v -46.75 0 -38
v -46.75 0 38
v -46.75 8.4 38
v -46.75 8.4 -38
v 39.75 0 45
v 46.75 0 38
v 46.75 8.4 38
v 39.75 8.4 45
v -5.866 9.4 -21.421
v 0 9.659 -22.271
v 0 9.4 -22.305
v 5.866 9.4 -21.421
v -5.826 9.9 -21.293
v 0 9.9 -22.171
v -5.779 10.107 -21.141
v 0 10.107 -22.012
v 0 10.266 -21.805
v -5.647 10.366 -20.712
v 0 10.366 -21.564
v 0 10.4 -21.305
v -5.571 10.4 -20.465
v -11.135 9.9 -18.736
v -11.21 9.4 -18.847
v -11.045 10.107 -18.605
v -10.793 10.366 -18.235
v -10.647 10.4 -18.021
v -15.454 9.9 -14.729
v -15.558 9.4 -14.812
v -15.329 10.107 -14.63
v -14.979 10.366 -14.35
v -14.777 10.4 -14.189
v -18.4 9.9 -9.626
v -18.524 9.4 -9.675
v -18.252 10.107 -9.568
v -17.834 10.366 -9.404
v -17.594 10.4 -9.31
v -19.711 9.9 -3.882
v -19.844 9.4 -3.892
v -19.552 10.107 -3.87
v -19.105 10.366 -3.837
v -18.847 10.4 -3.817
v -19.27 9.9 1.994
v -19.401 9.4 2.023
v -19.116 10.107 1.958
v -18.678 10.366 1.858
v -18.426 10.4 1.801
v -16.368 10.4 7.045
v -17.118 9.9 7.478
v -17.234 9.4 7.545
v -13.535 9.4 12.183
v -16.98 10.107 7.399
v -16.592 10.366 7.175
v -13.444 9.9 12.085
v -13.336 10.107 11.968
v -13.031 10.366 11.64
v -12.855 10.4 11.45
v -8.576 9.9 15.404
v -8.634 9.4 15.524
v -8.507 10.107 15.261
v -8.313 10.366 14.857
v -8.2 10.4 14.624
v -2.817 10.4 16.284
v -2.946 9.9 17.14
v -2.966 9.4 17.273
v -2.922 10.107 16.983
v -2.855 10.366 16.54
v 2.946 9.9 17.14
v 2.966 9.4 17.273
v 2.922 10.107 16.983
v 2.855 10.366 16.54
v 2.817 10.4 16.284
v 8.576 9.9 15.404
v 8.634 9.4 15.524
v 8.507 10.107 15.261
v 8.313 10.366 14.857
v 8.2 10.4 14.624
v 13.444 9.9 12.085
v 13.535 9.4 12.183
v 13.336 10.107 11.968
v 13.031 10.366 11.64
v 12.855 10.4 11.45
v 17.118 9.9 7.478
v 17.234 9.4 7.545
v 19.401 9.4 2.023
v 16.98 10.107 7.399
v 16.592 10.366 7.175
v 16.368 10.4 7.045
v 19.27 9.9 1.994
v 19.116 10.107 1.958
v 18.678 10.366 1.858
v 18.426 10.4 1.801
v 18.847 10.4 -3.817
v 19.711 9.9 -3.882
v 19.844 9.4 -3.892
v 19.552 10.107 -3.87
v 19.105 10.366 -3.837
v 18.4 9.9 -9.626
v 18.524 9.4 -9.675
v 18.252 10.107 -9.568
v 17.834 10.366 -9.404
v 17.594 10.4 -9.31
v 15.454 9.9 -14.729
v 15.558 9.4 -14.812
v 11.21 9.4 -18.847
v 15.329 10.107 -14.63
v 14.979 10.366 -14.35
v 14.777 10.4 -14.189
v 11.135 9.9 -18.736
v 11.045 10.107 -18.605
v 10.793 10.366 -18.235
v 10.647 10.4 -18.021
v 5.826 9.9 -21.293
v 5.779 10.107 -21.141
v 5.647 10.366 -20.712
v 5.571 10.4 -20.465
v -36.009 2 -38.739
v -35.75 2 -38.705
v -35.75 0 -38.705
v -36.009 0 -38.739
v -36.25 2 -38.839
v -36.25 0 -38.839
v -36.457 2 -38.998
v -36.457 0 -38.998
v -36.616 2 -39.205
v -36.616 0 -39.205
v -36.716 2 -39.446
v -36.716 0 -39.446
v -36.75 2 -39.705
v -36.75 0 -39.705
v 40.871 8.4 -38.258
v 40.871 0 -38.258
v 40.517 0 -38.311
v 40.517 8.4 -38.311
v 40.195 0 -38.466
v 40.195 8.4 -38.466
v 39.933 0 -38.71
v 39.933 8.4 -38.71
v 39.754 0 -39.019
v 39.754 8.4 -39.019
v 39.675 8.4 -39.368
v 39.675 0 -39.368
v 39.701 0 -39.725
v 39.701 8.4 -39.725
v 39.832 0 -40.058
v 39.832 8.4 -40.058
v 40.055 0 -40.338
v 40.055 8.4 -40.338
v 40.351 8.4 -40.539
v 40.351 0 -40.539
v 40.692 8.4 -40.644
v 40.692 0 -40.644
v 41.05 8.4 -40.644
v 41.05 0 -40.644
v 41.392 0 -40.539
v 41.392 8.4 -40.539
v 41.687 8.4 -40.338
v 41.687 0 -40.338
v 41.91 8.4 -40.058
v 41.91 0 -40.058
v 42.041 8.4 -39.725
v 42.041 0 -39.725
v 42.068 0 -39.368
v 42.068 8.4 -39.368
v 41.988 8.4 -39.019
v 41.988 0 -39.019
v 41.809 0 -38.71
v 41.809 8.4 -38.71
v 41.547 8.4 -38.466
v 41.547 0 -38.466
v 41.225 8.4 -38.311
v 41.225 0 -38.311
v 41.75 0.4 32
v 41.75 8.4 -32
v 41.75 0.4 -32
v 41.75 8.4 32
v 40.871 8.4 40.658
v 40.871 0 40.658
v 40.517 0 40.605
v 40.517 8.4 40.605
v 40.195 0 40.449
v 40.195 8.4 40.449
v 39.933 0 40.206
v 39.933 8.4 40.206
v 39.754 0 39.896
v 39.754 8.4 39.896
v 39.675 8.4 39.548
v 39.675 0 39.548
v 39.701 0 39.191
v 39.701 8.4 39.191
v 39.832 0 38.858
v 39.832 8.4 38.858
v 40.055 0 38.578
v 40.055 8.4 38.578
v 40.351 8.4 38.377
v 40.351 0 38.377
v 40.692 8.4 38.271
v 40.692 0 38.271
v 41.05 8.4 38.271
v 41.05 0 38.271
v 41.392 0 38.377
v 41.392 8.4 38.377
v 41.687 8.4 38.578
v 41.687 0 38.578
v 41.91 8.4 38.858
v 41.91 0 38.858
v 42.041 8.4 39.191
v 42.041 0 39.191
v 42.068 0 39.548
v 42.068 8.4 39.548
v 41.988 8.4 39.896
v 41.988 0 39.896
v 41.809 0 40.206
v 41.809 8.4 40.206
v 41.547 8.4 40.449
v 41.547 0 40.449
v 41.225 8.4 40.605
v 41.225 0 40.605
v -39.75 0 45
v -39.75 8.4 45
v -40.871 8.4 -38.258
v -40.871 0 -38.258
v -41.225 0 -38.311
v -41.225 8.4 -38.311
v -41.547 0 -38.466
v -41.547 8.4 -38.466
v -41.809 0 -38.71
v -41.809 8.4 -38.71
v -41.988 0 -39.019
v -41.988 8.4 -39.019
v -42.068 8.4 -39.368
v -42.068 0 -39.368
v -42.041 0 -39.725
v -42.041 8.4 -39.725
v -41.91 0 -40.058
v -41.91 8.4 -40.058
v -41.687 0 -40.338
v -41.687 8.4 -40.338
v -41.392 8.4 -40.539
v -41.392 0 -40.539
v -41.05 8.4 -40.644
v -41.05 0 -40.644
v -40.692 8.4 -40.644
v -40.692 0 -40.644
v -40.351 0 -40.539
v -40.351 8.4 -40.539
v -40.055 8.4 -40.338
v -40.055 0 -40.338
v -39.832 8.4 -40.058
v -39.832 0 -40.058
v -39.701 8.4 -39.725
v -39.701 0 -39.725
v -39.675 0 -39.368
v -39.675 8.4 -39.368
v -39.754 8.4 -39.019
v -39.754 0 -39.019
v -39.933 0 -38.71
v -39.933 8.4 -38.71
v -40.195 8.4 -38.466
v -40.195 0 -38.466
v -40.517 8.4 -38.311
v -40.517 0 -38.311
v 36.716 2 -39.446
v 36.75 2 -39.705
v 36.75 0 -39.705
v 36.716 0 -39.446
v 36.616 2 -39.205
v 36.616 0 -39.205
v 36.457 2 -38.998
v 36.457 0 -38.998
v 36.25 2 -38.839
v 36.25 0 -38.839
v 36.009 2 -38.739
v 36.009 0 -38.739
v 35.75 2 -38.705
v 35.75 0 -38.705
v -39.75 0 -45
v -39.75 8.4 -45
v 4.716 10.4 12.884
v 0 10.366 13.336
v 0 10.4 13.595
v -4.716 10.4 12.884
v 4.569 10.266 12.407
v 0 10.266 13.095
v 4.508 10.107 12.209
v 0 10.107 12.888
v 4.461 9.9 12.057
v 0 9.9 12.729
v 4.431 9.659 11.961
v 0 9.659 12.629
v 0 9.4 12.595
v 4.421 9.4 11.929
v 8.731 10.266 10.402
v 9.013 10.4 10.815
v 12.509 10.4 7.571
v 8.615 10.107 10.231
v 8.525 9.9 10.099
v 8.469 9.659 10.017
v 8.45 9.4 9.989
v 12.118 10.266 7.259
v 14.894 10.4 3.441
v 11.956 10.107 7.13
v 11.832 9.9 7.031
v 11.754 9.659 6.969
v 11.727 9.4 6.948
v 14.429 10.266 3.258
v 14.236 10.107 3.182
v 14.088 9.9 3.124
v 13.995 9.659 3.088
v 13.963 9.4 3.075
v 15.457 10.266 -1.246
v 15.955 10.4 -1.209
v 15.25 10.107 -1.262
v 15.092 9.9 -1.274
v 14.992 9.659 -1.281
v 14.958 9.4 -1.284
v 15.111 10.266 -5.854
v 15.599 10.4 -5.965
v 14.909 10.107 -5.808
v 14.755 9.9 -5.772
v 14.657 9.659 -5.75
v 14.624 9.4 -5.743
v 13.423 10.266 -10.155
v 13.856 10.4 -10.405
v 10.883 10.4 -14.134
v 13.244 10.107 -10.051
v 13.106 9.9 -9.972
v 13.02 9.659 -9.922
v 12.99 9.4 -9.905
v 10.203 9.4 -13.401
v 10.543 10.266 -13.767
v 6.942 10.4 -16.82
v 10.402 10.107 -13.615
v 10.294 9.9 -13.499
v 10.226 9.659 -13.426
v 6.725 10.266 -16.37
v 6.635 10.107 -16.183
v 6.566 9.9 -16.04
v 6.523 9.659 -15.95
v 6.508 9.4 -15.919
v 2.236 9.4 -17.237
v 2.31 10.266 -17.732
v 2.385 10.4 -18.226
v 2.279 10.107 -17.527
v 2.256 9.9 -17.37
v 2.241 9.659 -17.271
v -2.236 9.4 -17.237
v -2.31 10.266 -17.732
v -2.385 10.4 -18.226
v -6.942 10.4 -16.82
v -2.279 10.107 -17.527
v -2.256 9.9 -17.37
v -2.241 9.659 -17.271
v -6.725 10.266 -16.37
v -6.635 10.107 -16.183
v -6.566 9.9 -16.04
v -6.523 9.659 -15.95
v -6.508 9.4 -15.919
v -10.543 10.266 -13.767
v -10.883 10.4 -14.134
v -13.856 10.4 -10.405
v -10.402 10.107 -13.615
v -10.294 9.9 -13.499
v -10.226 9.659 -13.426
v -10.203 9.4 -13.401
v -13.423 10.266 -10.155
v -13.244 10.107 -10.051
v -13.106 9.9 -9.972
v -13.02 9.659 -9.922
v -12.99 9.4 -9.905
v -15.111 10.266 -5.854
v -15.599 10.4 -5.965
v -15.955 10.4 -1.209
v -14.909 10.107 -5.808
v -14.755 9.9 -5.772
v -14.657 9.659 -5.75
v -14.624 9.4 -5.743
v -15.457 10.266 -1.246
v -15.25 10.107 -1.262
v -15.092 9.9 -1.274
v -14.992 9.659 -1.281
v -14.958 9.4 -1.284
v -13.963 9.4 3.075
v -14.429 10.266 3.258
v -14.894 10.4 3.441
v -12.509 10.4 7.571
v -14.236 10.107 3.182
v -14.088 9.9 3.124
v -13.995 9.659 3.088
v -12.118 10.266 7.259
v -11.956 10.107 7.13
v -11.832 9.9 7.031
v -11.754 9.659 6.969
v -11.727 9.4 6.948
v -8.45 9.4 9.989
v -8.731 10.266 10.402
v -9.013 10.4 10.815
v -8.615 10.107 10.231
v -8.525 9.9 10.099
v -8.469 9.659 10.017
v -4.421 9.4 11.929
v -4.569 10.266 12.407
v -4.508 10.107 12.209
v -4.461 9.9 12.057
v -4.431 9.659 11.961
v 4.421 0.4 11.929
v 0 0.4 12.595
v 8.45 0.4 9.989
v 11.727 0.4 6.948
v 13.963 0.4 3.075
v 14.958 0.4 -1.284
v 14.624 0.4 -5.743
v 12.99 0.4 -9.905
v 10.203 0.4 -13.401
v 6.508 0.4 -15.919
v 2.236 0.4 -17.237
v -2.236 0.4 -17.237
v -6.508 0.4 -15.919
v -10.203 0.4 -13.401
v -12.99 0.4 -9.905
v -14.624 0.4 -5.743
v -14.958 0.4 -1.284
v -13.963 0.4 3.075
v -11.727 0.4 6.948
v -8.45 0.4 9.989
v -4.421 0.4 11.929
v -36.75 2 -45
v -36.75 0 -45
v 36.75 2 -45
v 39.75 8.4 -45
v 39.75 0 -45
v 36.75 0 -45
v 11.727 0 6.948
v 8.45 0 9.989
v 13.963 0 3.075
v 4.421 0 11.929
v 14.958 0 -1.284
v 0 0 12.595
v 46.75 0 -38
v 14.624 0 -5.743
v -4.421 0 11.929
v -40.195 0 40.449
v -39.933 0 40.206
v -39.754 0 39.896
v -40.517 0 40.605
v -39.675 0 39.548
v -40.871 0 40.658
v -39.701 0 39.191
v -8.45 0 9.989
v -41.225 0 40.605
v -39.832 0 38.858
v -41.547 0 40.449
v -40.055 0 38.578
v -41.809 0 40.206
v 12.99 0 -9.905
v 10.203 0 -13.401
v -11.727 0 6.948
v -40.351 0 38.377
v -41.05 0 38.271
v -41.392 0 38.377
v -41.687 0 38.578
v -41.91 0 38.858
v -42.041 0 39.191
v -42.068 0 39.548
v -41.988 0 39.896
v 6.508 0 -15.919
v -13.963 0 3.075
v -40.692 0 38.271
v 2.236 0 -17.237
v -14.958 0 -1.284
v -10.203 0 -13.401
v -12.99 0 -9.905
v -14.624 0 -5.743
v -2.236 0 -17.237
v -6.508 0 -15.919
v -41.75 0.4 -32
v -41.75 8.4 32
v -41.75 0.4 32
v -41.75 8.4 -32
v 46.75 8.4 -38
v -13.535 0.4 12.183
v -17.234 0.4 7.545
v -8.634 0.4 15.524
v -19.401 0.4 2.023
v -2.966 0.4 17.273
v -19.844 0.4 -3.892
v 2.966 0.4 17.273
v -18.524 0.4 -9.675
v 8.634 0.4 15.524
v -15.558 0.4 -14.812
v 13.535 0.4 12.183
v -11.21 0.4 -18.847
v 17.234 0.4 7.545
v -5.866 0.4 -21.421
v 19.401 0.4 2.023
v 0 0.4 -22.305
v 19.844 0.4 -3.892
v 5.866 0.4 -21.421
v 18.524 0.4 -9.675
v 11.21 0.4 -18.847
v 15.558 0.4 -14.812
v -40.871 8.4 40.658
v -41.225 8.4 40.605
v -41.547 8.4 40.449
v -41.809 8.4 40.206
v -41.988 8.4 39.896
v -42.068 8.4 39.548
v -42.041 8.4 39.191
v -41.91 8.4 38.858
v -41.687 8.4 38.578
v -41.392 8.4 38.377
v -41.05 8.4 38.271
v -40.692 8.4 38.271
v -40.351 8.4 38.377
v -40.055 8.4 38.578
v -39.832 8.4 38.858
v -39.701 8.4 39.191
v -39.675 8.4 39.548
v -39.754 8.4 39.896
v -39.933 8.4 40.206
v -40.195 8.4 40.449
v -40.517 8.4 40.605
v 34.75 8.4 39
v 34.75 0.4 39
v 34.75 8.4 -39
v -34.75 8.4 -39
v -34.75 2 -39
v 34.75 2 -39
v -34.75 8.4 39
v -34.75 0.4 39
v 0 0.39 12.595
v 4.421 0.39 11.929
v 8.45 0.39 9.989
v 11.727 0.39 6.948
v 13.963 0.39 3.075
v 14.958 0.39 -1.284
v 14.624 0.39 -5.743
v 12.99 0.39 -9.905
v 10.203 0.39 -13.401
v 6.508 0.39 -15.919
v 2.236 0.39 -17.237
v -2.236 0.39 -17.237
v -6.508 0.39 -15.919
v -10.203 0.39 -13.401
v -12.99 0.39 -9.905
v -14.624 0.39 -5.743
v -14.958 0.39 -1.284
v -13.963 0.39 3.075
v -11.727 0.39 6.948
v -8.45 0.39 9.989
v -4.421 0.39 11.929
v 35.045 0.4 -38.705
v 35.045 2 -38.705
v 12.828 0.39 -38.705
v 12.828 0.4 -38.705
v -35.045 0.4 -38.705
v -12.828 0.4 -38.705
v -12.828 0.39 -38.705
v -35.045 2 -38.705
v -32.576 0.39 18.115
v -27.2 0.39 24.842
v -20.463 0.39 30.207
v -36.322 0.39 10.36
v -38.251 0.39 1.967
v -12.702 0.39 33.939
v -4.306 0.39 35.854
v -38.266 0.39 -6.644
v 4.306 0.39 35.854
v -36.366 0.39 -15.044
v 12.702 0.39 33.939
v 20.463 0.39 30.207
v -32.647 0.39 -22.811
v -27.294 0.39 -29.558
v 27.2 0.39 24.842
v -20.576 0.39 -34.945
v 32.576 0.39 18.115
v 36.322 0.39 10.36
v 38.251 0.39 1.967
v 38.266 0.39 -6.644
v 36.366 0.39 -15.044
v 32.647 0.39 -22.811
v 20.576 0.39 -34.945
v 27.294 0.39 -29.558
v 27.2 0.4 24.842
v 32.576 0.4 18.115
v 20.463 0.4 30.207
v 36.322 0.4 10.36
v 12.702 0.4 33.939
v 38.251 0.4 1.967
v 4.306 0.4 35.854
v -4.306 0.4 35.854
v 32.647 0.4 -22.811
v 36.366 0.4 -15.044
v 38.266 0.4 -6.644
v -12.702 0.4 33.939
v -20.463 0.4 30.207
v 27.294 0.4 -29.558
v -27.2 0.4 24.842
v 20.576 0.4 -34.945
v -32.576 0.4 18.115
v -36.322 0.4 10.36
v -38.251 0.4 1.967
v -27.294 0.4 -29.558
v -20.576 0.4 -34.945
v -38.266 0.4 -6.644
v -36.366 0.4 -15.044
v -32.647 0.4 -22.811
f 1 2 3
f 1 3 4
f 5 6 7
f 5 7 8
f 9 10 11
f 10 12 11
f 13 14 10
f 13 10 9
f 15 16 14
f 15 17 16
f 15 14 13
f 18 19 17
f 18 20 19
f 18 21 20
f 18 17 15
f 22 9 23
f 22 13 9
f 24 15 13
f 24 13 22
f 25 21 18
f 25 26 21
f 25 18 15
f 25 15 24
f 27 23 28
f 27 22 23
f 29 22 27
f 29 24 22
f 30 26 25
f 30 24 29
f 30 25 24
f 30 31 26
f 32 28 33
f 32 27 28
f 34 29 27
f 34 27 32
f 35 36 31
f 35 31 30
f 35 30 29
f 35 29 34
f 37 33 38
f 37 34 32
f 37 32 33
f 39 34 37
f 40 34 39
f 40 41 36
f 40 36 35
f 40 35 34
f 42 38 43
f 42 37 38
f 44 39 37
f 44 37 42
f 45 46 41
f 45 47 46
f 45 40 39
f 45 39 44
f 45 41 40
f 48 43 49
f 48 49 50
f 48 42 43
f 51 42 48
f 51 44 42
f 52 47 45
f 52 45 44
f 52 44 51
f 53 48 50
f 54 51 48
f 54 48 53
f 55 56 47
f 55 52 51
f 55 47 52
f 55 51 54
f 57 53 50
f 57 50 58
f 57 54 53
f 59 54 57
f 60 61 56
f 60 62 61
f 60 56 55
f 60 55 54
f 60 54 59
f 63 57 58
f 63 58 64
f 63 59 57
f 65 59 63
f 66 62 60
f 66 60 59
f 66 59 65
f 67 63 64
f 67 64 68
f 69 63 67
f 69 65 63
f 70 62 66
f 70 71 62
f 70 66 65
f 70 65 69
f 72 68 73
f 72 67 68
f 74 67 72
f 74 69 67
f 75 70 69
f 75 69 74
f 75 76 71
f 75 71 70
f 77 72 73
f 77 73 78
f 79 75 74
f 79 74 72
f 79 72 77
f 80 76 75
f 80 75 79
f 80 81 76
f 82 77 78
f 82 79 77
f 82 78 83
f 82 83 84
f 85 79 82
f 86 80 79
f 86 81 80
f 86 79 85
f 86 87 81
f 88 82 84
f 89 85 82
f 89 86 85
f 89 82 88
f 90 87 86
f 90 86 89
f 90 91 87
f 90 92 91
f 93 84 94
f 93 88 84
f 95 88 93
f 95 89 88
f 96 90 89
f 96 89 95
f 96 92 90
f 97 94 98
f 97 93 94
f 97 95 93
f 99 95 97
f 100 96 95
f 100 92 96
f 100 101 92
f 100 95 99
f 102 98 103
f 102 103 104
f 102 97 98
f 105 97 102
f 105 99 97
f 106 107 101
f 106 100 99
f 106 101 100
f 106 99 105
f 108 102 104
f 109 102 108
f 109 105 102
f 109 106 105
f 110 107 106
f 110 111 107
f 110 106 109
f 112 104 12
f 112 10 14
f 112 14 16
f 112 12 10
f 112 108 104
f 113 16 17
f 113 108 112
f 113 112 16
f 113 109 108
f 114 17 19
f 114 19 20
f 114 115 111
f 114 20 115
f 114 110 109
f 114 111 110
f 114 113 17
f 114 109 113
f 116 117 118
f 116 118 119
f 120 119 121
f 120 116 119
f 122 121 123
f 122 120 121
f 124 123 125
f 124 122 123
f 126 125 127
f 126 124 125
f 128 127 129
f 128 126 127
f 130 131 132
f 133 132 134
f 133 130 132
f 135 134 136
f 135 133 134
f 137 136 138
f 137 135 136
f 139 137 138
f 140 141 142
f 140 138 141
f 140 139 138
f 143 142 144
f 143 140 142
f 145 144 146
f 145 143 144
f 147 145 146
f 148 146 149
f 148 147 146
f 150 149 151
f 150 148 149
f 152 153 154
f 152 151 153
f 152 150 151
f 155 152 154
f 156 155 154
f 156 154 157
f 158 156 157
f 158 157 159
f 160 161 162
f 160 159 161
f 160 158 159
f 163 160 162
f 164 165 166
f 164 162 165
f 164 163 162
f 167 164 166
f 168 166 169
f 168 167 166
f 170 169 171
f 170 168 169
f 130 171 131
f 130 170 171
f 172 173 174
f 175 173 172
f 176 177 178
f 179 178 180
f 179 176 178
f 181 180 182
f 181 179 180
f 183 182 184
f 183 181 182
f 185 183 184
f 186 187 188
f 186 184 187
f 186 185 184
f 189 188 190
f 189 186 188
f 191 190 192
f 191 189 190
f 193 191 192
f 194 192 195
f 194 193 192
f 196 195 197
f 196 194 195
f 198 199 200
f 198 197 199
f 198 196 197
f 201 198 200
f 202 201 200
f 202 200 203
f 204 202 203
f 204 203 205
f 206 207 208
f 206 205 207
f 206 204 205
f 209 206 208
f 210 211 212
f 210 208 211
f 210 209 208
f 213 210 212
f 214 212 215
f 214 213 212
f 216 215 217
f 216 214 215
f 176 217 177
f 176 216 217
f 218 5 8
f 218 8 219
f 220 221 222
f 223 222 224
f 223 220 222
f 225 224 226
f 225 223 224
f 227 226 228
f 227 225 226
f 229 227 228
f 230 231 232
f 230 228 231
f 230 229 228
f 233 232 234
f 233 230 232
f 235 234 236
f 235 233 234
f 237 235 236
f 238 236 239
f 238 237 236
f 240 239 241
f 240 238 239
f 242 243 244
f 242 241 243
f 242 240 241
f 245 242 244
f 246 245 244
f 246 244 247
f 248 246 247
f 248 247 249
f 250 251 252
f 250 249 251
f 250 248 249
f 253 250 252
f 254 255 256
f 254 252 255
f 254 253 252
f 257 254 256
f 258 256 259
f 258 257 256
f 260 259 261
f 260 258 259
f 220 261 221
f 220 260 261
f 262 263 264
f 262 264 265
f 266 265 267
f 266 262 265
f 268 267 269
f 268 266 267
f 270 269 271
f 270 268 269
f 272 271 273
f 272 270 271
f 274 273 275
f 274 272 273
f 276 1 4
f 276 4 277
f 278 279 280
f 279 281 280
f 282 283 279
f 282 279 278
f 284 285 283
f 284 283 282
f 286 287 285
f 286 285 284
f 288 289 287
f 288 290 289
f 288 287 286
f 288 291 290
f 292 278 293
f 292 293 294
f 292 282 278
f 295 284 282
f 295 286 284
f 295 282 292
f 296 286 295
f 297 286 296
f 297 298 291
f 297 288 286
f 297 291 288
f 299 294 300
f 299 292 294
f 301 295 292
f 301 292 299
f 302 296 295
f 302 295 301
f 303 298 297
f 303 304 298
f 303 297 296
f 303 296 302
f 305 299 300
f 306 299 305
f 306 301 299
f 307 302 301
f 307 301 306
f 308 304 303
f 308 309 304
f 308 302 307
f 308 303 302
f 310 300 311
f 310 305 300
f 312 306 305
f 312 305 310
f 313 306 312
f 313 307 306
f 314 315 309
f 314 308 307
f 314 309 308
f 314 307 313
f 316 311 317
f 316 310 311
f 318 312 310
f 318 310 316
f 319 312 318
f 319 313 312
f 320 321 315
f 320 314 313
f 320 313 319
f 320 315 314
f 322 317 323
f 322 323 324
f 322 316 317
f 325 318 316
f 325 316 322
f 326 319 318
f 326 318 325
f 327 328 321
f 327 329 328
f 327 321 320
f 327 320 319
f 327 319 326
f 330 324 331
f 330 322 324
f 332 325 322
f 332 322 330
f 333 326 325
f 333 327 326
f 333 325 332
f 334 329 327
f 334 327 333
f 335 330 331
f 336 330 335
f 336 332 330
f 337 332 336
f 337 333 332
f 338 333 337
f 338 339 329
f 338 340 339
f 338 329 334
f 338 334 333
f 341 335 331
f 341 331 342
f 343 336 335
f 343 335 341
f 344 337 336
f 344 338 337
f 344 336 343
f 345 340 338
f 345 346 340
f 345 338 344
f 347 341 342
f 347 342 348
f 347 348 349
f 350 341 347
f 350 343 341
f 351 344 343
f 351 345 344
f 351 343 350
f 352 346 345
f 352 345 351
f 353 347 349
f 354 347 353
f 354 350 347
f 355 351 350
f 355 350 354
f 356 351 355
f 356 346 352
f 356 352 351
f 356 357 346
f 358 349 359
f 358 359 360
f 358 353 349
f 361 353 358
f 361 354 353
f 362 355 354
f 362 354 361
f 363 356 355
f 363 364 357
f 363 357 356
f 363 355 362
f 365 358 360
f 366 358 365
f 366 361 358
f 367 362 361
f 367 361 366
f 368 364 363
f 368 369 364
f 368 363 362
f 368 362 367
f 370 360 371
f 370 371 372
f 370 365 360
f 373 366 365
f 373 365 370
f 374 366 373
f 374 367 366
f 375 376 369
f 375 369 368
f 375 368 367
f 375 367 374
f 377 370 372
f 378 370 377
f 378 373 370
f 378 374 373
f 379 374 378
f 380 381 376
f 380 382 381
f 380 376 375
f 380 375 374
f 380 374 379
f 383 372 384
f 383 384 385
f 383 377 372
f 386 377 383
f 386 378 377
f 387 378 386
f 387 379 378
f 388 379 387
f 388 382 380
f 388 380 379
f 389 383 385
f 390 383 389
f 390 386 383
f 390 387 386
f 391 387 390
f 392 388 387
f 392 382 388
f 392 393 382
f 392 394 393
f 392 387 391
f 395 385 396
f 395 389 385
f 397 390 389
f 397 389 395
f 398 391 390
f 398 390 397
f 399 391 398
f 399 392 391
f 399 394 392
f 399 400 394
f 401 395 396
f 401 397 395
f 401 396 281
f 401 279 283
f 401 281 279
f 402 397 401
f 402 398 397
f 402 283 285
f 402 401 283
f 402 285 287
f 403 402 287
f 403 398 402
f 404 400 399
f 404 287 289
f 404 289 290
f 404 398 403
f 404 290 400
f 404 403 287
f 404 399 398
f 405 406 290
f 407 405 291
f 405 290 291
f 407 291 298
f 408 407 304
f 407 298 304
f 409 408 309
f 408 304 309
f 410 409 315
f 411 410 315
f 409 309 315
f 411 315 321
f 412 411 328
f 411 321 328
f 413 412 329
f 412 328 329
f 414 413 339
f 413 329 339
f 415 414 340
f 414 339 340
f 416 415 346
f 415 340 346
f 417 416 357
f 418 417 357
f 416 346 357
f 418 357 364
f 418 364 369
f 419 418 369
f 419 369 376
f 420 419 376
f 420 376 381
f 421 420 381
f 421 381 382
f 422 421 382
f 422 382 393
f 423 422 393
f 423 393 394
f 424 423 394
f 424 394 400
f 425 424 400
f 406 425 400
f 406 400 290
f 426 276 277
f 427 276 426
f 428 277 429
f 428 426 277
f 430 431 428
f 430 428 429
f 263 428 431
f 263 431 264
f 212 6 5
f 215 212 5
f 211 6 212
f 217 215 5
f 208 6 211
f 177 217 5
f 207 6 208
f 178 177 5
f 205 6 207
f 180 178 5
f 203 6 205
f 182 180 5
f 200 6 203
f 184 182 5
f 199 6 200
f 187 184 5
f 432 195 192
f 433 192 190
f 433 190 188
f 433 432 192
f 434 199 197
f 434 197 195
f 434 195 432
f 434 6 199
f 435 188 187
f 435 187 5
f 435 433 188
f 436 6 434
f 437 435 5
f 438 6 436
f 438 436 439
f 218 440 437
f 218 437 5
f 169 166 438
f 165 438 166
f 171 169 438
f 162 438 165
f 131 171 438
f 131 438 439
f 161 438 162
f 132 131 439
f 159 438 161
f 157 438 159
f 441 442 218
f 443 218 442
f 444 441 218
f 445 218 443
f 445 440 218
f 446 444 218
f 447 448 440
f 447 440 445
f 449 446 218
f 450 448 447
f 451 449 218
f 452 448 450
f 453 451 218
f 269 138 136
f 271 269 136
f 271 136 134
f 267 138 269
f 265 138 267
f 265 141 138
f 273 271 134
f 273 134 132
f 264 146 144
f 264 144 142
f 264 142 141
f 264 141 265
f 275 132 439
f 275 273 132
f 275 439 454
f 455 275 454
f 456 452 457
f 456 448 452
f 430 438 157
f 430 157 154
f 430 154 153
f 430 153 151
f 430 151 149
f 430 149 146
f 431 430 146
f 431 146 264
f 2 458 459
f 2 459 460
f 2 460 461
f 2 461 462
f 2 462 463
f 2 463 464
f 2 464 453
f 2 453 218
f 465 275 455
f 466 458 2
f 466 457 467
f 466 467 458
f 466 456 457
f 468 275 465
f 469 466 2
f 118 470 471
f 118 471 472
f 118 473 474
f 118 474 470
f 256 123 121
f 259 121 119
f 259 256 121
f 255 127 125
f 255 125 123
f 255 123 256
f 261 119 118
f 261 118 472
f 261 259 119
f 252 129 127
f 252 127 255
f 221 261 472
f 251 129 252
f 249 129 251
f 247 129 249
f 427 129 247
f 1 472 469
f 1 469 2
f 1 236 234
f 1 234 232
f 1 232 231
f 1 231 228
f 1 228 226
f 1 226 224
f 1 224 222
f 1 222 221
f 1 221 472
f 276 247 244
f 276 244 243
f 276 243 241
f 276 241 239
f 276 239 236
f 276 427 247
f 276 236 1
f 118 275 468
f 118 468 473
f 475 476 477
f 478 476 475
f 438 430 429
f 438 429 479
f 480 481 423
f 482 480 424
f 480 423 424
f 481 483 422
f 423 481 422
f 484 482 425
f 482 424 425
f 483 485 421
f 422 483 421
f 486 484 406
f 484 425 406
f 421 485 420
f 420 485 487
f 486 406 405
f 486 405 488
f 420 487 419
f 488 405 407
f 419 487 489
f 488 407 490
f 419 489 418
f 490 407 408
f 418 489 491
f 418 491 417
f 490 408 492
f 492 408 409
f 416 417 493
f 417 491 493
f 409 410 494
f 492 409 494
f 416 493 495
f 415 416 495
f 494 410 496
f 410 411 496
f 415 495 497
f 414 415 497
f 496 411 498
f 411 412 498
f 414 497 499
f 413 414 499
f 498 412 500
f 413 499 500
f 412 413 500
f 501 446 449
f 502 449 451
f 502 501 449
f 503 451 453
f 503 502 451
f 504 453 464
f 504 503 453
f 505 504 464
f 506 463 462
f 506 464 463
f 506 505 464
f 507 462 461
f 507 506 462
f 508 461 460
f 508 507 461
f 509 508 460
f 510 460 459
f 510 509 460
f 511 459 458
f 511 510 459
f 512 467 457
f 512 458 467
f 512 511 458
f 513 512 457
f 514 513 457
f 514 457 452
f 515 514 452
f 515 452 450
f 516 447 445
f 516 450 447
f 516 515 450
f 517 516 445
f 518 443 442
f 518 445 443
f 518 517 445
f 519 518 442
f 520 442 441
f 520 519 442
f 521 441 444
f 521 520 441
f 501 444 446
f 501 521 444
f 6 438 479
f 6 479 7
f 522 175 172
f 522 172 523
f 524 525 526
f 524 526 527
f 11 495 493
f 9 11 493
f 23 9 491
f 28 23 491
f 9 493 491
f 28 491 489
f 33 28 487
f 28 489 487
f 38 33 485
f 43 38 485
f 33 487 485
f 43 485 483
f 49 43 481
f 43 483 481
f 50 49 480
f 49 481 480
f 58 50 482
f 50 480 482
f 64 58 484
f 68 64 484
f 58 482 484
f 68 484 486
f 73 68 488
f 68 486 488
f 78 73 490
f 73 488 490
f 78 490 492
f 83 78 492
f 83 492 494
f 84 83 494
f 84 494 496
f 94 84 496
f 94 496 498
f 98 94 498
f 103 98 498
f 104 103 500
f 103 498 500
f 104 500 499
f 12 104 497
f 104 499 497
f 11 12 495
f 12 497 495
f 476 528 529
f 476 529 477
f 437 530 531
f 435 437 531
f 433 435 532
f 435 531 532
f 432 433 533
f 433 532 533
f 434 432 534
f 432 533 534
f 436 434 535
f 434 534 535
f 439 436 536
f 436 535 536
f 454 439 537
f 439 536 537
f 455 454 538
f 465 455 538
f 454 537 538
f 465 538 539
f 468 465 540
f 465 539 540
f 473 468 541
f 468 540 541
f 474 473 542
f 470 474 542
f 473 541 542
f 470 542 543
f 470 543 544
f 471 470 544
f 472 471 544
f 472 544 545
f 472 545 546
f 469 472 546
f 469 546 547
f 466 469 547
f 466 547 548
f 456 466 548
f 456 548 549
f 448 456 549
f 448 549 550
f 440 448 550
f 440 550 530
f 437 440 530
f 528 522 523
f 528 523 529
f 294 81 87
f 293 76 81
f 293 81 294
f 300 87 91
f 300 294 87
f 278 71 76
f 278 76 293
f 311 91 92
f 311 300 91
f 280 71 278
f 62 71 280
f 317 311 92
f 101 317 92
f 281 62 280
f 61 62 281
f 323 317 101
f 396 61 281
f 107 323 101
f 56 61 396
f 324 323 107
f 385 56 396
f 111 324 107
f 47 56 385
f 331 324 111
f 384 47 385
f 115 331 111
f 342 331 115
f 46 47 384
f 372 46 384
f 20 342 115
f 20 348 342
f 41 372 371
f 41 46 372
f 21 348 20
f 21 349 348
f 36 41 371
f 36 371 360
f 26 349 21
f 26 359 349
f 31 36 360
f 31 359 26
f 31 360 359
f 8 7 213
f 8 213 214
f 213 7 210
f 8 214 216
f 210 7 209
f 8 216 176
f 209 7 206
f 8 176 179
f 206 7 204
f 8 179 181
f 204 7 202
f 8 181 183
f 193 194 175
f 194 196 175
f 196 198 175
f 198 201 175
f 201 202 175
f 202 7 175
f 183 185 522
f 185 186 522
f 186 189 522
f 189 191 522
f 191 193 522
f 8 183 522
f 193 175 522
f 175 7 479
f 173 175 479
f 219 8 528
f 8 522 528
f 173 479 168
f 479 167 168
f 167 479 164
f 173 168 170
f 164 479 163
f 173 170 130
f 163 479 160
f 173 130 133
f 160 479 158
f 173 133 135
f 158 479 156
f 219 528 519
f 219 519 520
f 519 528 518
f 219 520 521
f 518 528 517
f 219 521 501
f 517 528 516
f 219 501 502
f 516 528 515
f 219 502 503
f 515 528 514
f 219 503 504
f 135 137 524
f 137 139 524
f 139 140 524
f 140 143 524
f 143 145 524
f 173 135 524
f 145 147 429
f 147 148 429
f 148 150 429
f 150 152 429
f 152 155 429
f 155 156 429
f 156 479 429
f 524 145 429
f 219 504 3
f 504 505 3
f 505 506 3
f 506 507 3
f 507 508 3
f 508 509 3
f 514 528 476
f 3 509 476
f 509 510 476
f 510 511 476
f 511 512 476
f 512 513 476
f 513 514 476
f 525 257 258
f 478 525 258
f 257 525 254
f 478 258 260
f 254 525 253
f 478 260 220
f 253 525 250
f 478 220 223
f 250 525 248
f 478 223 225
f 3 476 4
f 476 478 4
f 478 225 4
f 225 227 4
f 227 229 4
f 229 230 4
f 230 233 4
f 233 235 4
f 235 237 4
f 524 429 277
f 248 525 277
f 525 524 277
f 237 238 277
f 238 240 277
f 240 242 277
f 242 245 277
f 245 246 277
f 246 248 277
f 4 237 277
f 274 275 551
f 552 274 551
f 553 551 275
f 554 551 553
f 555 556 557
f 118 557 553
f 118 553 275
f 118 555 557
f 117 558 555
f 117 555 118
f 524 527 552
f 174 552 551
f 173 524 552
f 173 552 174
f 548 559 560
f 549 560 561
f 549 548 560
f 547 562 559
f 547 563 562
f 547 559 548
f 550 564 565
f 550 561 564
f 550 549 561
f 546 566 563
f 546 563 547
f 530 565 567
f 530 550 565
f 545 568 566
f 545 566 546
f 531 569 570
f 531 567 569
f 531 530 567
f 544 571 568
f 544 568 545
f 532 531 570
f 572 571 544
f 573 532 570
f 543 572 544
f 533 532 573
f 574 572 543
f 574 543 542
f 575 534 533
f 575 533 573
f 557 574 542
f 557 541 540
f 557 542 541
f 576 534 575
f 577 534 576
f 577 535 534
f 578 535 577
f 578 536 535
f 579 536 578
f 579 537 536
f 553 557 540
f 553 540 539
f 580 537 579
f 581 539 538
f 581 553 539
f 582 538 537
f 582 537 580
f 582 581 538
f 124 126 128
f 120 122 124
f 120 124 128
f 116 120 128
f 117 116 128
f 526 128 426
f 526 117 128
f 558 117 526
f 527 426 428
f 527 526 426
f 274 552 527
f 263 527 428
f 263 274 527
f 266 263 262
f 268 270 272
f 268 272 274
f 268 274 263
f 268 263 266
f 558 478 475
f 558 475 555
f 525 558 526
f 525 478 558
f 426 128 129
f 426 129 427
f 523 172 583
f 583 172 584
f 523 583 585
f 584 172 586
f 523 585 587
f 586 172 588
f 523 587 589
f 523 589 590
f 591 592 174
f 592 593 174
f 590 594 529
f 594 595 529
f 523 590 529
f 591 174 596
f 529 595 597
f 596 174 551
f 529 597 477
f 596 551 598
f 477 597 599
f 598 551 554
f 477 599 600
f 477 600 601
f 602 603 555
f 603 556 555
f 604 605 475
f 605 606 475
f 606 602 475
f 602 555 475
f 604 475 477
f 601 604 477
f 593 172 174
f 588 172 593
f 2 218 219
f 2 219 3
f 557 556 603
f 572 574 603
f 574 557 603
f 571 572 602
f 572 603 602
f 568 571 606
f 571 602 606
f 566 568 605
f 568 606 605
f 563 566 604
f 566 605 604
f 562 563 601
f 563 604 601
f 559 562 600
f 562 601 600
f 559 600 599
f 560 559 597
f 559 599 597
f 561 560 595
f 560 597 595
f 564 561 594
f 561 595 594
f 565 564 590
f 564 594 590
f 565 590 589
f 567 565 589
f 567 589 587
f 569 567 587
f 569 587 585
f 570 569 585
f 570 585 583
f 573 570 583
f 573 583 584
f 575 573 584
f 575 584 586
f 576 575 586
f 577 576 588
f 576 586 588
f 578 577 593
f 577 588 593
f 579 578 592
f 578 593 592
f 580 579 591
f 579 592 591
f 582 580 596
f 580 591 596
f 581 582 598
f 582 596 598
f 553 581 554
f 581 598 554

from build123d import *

# Parameters (mm, degrees)
BOSS_EXTRUDE1_DEPTH           = 8.4
CUT_EXTRUDE1_DEPTH            = 66.430287329
CUT_EXTRUDE1_DEPTH_BACK       = 2
CUT_EXTRUDE2_DEPTH            = 8
SKETCH8_R                     = 19.9
BOSS_EXTRUDE2_DEPTH           = 10
FILLET1_R                     = 1
SKETCH9_R                     = 38.5
CUT_EXTRUDE4_DEPTH            = 0.01
M2_CLEARANCE_HOLE1_AT_2_COUNT = 2
M2_CLEARANCE_HOLE1_AT_2_PITCH = 81.742360825
M2_CLEARANCE_HOLE1_AT_3_COUNT = 2
M2_CLEARANCE_HOLE1_AT_3_PITCH = 113.62
M2_CLEARANCE_HOLE1_AT_4_COUNT = 2
M2_CLEARANCE_HOLE1_AT_4_PITCH = 78.915719896
SKETCH13_R                    = 15
CUT_EXTRUDE5_DEPTH            = 66.71698791
FILLET2_R                     = 1


with BuildPart() as part:
    # Sketch4 → Boss-Extrude1 (new body)
    with BuildSketch(Plane(origin=(0, 0, 0), x_dir=(1, 0, 0), z_dir=(0, 1, 0))):
        Polygon((-46.75, 38), (-39.75, 45), (39.75, 45), (46.75, 38), (46.75, -38), (39.75, -45), (-39.75, -45), (-46.75, -38), align=None)
    extrude(amount=BOSS_EXTRUDE1_DEPTH)

    # Sketch5 → Cut-Extrude1 (cut, two sides: drawn at the far end of the back side and taken through both)
    with BuildSketch(Plane.XZ.offset(-CUT_EXTRUDE1_DEPTH_BACK)):
        with BuildLine():
            Line((36.75, -300.538184403), (36.75, -45))
            Line((36.75, -45), (36.75, -39.704788024))
            ThreePointArc((36.75, -39.704788024), (36.457106781, -38.997681243), (35.75, -38.704788024))
            Line((35.75, -38.704788024), (-35.75, -38.704788024))
            ThreePointArc((-35.75, -38.704788024), (-36.457106781, -38.997681243), (-36.75, -39.704788024))
            Line((-36.75, -39.704788024), (-36.75, -45))
            Line((-36.75, -45), (-36.75, -300.538184403))
            Line((-36.75, -300.538184403), (-36.75, -811.614553209))
            Line((-36.75, -811.614553209), (36.75, -811.614553209))
            Line((36.75, -811.614553209), (36.75, -300.538184403))
        make_face()
    extrude(amount=CUT_EXTRUDE1_DEPTH + CUT_EXTRUDE1_DEPTH_BACK, mode=Mode.SUBTRACT)

    # Sketch6 → Cut-Extrude2 (cut)
    with BuildSketch(Plane(origin=(0, 8.4, 0), x_dir=(1, 0, 0), z_dir=(0, 1, 0))):
        Polygon((-41.75, 32), (-34.75, 39), (34.75, 39), (41.75, 32), (41.75, -32), (34.75, -39), (-34.75, -39), (-41.75, -32), align=None)
    extrude(amount=-CUT_EXTRUDE2_DEPTH, mode=Mode.SUBTRACT)

    # Sketch8 → Boss-Extrude2 (add)
    with BuildSketch(Plane(origin=(0, 0.4, 0), x_dir=(1, 0, 0), z_dir=(0, 1, 0))):
        with Locations(Location((0, 2.404788, 0), (0, 0, 90))):
            Circle(SKETCH8_R)
    extrude(amount=BOSS_EXTRUDE2_DEPTH)

    # Fillet1
    fillet1_edges = [part.edges().sort_by_distance(p)[0] for p in [
        (0, 10.4, 17.495212),
    ]]
    fillet(fillet1_edges, radius=FILLET1_R)

    # Sketch9 → Cut-Extrude4 (cut)
    with BuildSketch(Plane(origin=(0, 0.4, 0), x_dir=(1, 0, 0), z_dir=(0, 1, 0))):
        with Locations((0, 2.404788)):
            Circle(SKETCH9_R)
    extrude(amount=-CUT_EXTRUDE4_DEPTH, mode=Mode.SUBTRACT)


with BuildPart() as cut_extrude4_piece_1:
    # of the separate pieces the step leaves, piece 1, a body of its own (cut_extrude4_pieces)
    add(part.part.solids().sort_by_distance((-34.75, 0.4, 39))[0])

    # Sketch10 → M2 Clearance Hole1 (revolve, cut)
    with BuildSketch(Plane(origin=(40.871180413, 8.4, 39.457859948), x_dir=(0, 0, 1), z_dir=(1, 0, 0))):
        Polygon((0, 0), (0, 38.821032743), (1.2, 38.1), (1.2, 0), align=None)
    m2_clearance_hole1 = revolve(axis=Axis((40.871180413, 14.75, 39.457859948), (0, -1, 0)), mode=Mode.SUBTRACT)

    # M2 Clearance Hole1 at 2: M2 Clearance Hole1 ×2
    with Locations(*[(-i * M2_CLEARANCE_HOLE1_AT_2_PITCH, 0, 0) for i in range(1, M2_CLEARANCE_HOLE1_AT_2_COUNT)]):
        add(m2_clearance_hole1, mode=Mode.SUBTRACT)

    # M2 Clearance Hole1 at 3: M2 Clearance Hole1 ×2
    with Locations(*[Vector(-0.7194363741011156, 0, -0.6945583514869285) * (i * M2_CLEARANCE_HOLE1_AT_3_PITCH) for i in range(1, M2_CLEARANCE_HOLE1_AT_3_COUNT)]):
        add(m2_clearance_hole1, mode=Mode.SUBTRACT)

    # M2 Clearance Hole1 at 4: M2 Clearance Hole1 ×2
    with Locations(*[(0, 0, -i * M2_CLEARANCE_HOLE1_AT_4_PITCH) for i in range(1, M2_CLEARANCE_HOLE1_AT_4_COUNT)]):
        add(m2_clearance_hole1, mode=Mode.SUBTRACT)


with BuildPart() as cut_extrude4_piece_2:
    # of the separate pieces the step leaves, piece 2, a body of its own (cut_extrude4_pieces)
    add(part.part.solids().sort_by_distance((0, 9.4, -22.304788))[0])


with BuildPart() as cut_extrude5_tool:
    # Sketch13 → Cut-Extrude5 (new, through all)
    with BuildSketch(Plane(origin=(0, 10.4, 0), x_dir=(1, 0, 0), z_dir=(0, 1, 0))):
        with Locations(Location((0, 2.404788, 0), (0, 0, 270))):
            Circle(SKETCH13_R)
    extrude(amount=-CUT_EXTRUDE5_DEPTH)


with BuildPart() as cut_extrude4_piece_1_1:
    add(cut_extrude4_piece_1.part)

    # Cut-Extrude5: cut by cut_extrude5_tool
    add(cut_extrude5_tool.part, mode=Mode.SUBTRACT)


with BuildPart() as cut_extrude4_piece_2_1:
    add(cut_extrude4_piece_2.part)

    # Cut-Extrude5: cut by cut_extrude5_tool
    add(cut_extrude5_tool.part, mode=Mode.SUBTRACT)

    # Fillet2
    fillet2_edges = [cut_extrude4_piece_2_1.edges().sort_by_distance(p)[0] for p in [
        (0, 10.4, -17.404788),
    ]]
    fillet(fillet2_edges, radius=FILLET2_R)


solid = Compound([cut_extrude4_piece_1_1.part, cut_extrude4_piece_2_1.part])
